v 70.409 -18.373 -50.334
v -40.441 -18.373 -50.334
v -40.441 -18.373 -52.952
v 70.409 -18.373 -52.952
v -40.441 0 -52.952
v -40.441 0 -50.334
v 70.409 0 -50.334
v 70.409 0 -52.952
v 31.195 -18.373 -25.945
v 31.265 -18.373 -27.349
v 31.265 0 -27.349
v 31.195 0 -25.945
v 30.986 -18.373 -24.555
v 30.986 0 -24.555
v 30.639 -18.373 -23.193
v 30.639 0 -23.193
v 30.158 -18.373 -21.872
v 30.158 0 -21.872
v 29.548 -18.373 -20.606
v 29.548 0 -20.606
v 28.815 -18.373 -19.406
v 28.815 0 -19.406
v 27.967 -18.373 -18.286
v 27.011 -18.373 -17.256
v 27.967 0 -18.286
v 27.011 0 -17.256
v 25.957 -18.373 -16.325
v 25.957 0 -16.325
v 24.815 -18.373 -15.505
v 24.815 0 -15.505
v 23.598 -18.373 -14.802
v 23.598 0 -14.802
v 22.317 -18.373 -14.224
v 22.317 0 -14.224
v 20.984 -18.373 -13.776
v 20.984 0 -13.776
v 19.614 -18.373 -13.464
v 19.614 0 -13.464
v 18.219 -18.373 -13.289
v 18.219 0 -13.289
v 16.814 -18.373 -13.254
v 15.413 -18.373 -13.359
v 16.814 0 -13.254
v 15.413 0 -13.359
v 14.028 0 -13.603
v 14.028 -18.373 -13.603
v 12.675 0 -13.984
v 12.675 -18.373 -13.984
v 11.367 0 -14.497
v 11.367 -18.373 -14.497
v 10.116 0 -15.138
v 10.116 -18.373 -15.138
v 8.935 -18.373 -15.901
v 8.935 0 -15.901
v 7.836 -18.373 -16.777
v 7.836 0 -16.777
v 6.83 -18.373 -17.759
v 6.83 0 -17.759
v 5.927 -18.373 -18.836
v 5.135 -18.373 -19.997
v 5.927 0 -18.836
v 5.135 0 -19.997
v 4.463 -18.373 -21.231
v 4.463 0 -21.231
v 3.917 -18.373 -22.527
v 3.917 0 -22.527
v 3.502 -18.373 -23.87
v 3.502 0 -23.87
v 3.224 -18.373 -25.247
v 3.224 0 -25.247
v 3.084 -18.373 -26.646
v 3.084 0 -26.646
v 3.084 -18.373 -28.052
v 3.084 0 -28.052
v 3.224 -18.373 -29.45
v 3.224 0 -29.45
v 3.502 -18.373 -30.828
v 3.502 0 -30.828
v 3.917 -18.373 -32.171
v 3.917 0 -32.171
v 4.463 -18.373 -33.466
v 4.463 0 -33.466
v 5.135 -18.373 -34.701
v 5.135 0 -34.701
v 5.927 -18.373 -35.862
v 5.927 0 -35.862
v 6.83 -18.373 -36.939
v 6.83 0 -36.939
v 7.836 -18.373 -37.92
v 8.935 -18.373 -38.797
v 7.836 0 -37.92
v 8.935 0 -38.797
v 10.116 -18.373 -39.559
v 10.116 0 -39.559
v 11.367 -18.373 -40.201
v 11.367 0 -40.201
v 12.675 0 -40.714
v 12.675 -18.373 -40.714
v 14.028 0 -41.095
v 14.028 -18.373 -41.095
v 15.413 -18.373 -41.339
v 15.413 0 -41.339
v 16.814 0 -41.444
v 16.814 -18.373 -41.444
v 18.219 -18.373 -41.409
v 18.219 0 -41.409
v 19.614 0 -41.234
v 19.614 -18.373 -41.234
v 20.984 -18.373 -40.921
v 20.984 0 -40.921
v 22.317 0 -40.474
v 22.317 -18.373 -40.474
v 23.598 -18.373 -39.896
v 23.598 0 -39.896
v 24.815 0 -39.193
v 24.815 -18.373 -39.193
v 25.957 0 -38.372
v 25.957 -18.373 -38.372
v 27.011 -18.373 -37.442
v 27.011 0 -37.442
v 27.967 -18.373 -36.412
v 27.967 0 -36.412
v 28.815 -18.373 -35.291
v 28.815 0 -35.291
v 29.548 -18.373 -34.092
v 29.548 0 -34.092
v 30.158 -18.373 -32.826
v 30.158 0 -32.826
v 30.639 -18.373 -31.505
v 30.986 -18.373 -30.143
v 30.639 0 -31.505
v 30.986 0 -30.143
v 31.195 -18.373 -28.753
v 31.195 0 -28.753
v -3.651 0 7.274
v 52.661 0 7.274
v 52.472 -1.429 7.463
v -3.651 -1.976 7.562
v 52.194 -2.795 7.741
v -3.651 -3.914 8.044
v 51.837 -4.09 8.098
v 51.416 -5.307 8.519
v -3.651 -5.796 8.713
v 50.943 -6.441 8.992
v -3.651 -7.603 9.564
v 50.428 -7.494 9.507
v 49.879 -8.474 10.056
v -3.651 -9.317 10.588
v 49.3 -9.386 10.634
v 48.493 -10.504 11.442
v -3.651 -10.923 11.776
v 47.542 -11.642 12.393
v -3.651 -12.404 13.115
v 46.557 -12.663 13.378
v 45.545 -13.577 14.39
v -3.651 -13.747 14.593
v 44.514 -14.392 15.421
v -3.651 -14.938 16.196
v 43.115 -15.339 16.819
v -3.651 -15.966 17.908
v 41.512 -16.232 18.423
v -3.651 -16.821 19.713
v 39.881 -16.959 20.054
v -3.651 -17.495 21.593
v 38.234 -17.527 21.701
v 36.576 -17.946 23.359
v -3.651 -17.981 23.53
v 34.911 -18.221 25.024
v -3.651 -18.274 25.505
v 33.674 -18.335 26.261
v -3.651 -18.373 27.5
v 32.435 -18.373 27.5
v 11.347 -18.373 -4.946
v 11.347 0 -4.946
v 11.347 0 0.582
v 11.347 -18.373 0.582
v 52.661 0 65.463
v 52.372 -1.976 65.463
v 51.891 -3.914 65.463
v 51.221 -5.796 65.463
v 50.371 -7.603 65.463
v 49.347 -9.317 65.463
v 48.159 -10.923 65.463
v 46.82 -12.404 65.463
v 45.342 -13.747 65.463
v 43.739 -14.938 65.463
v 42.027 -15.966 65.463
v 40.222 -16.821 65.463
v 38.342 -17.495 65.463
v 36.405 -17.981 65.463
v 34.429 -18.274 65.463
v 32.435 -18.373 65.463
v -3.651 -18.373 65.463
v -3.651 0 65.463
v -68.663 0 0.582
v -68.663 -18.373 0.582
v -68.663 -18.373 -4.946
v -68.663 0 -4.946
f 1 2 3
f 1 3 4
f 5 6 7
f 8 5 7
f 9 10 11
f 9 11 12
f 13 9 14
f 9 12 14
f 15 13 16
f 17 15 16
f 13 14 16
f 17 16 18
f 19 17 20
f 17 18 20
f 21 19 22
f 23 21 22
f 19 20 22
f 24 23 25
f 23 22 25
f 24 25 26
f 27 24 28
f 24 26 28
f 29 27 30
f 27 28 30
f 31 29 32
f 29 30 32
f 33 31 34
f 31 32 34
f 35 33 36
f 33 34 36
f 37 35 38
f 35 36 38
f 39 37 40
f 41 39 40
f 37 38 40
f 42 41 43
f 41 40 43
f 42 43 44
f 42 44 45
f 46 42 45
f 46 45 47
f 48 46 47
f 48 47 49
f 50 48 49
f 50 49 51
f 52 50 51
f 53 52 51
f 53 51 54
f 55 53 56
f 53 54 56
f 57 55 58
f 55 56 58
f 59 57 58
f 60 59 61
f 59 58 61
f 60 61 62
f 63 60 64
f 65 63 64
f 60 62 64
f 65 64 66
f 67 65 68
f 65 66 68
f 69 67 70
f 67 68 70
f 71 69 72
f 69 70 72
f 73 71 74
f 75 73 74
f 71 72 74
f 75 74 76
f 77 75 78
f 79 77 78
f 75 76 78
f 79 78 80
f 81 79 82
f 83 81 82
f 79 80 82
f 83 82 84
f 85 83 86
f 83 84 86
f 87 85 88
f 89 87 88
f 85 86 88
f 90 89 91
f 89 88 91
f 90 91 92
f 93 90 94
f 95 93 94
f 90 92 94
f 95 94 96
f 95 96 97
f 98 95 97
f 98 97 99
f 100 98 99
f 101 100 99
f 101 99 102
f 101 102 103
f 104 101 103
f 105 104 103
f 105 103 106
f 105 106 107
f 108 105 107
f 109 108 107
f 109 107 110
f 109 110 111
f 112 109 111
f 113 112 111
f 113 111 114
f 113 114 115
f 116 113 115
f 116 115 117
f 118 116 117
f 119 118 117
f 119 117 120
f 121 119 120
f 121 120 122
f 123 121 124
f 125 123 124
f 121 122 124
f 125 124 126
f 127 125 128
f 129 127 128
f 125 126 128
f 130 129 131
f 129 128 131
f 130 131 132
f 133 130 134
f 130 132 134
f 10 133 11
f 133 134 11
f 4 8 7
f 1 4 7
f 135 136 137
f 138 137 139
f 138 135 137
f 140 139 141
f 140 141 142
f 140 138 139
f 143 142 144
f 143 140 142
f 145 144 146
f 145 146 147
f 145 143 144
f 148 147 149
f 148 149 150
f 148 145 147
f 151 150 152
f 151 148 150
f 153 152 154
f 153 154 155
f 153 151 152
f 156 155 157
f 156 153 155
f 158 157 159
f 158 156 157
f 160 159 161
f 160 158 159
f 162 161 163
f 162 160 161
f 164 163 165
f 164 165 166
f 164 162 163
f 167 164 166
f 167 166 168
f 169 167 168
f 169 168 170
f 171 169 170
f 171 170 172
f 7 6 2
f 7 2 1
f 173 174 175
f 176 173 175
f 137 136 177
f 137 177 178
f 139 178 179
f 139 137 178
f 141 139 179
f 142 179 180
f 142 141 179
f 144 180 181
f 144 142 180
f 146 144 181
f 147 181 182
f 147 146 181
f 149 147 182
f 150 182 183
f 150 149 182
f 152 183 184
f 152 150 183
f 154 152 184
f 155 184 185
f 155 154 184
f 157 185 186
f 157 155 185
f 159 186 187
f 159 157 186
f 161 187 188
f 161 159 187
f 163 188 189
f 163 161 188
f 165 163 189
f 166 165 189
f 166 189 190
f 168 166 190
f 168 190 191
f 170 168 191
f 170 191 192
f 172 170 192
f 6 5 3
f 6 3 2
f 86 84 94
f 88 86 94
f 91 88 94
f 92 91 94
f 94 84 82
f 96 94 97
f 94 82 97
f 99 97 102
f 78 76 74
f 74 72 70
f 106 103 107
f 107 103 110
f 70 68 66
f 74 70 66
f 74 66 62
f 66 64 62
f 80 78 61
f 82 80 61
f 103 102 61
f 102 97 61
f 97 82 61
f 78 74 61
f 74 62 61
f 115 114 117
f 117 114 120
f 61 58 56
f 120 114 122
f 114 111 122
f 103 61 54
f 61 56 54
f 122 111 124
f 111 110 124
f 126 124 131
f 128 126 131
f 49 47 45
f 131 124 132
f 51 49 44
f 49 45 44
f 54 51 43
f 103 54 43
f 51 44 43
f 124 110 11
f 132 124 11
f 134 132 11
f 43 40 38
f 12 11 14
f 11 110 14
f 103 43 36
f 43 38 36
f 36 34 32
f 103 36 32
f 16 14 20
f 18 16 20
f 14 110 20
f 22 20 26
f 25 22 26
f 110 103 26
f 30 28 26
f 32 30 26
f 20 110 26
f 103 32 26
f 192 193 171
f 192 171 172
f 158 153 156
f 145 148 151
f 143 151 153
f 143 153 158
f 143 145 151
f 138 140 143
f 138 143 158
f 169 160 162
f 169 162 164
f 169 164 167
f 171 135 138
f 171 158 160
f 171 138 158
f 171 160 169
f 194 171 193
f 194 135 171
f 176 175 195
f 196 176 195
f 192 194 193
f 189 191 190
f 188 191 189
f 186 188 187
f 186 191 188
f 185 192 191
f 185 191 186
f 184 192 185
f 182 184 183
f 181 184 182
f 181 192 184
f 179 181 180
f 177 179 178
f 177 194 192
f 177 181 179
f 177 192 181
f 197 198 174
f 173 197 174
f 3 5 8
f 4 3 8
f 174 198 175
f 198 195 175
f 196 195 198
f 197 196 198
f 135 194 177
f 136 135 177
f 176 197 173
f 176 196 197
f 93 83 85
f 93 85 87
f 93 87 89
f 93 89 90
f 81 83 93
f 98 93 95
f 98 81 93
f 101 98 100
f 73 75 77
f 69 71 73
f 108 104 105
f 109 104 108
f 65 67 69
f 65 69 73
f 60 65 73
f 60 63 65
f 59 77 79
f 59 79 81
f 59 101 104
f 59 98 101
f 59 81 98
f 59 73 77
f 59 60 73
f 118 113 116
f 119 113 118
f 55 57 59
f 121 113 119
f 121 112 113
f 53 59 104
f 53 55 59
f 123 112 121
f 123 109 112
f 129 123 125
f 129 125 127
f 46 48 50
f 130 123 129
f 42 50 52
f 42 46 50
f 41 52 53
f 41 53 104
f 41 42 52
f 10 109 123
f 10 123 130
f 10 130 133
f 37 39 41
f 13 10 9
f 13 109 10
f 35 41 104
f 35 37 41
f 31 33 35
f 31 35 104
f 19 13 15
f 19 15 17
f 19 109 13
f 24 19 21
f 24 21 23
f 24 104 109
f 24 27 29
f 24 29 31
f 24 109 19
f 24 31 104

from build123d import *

# Parameters (mm, degrees)
F0_W        = 110.8502186835
F0_H        = 2.6185084134
F1_DEPTH    = 18.3726
F0_W_2      = 56.3120255373
F0_H_2      = 58.1890968606
F0_R        = 14.0994798806
F2_T1_DEPTH = 157.4443686872
F3_T1_DEPTH = 139.0949713805


# Not quite as in the source:
# - a fillet or chamfer that OpenCascade refuses, or shapes differently, is made with other operations: its cross-section is extruded or revolved along the edge and cut away or added


with BuildPart() as f1:
    # F0 (on Front) → F1 (new body)
    with BuildSketch(Plane.XZ):
        with Locations((14.9836894125, -51.6428193077)):
            Rectangle(F0_W, F0_H)
    extrude(amount=F1_DEPTH)


with BuildPart() as f1b:
    # F0 (on Front) → F1, piece 2 (new body)
    with BuildSketch(Plane.XZ):
        with Locations((24.5051165048, 36.3681823947)):
            Rectangle(F0_W_2, F0_H_2)
    extrude(amount=F1_DEPTH)

    # F2: fillet of radius 20.32 on 1 edges, made by hand

    # F2_s2 → F2_t1 (cut)
    with BuildSketch(Plane.YZ.offset(-54.2170678388)):
        with BuildLine():
            ThreePointArc((0, 7.2736339644), (-13.0937696354, 13.8375400236), (-18.3726, 27.5001025944))
            Line((-18.3726, 27.5001025944), (-18.3726, 7.2736339644))
            Line((-18.3726, 7.2736339644), (0, 7.2736339644))
        make_face()
    extrude(amount=F2_T1_DEPTH, mode=Mode.SUBTRACT)

    # F3: fillet of radius 20.32 on 1 edges, made by hand

    # F3_s2 → F3_t1 (cut)
    with BuildSketch(Plane.XY.offset(-23.0660689806)):
        with BuildLine():
            ThreePointArc((52.6611292735, 0), (46.0972232142, -13.0937696354), (32.4346606435, -18.3726))
            Line((32.4346606435, -18.3726), (52.6611292735, -18.3726))
            Line((52.6611292735, -18.3726), (52.6611292735, 0))
        make_face()
    extrude(amount=F3_T1_DEPTH, mode=Mode.SUBTRACT)


with BuildPart() as f1c:
    # F0 (on Front) → F1, piece 3 (new body)
    with BuildSketch(Plane.XZ):
        with Locations((17.1657819301, -27.3488722742)):
            Circle(F0_R)
    extrude(amount=F1_DEPTH)


with BuildPart() as f1d:
    # F0 (on Front) → F1, piece 4 (new body)
    with BuildSketch(Plane.XZ):
        Polygon((-68.6631277204, -4.9460716546), (11.3468747586, -4.9460716546), (11.3468747586, 0), (11.3468747586, 0.5818922073), (-68.6631277204, 0.5818922073), align=None)
    extrude(amount=F1_DEPTH)


solid = Compound([f1.part, f1b.part, f1c.part, f1d.part])
